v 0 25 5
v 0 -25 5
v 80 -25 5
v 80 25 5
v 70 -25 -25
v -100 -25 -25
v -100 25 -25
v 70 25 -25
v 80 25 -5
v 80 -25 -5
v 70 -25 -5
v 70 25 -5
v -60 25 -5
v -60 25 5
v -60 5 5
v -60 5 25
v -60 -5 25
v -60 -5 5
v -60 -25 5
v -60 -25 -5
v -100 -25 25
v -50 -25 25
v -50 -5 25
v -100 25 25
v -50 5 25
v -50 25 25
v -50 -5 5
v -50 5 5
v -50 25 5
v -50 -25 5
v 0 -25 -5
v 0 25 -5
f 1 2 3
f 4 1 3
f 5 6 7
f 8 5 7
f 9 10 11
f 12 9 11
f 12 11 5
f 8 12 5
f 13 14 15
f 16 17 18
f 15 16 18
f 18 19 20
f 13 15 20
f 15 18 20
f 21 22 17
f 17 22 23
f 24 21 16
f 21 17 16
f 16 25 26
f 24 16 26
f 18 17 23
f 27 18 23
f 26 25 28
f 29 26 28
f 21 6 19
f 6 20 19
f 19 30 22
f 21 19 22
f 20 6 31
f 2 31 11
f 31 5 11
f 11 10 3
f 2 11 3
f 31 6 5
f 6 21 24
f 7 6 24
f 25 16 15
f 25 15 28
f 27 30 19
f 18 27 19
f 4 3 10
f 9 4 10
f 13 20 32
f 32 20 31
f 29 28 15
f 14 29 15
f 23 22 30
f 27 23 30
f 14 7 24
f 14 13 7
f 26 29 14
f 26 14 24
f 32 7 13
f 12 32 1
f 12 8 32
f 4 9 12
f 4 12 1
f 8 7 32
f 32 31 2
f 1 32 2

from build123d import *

# Parameters (mm, degrees)
F0_W     = 50
F0_H     = 50
F1_DEPTH = 100
F3_DEPTH = 50
F4_W     = 10
F4_H     = 10
F5_DEPTH = 20


with BuildPart() as f1:
    # F0 (on Right) → F1 (new body, symmetric)
    with BuildSketch(Plane.YZ):
        Rectangle(F0_W, F0_H)
    extrude(amount=F1_DEPTH, both=True)

    # F2 (on face) → F3 (cut, through all)
    with BuildSketch(Plane.XZ.offset(25)):
        Polygon((-60, 5), (-60, -5), (0, -5), (0, 5), (80, 5), (80, -5), (70, -5), (70, -25), (100, -25), (100, 25), (-50, 25), (-50, 5), align=None)
    extrude(amount=-F3_DEPTH, mode=Mode.SUBTRACT)

    # F4 (on face) → F5 (cut, through all)
    with BuildSketch(Plane.XY.offset(25)):
        with Locations((-55, 0)):
            Rectangle(F4_W, F4_H)
    extrude(amount=-F5_DEPTH, mode=Mode.SUBTRACT)


solid = f1.part
